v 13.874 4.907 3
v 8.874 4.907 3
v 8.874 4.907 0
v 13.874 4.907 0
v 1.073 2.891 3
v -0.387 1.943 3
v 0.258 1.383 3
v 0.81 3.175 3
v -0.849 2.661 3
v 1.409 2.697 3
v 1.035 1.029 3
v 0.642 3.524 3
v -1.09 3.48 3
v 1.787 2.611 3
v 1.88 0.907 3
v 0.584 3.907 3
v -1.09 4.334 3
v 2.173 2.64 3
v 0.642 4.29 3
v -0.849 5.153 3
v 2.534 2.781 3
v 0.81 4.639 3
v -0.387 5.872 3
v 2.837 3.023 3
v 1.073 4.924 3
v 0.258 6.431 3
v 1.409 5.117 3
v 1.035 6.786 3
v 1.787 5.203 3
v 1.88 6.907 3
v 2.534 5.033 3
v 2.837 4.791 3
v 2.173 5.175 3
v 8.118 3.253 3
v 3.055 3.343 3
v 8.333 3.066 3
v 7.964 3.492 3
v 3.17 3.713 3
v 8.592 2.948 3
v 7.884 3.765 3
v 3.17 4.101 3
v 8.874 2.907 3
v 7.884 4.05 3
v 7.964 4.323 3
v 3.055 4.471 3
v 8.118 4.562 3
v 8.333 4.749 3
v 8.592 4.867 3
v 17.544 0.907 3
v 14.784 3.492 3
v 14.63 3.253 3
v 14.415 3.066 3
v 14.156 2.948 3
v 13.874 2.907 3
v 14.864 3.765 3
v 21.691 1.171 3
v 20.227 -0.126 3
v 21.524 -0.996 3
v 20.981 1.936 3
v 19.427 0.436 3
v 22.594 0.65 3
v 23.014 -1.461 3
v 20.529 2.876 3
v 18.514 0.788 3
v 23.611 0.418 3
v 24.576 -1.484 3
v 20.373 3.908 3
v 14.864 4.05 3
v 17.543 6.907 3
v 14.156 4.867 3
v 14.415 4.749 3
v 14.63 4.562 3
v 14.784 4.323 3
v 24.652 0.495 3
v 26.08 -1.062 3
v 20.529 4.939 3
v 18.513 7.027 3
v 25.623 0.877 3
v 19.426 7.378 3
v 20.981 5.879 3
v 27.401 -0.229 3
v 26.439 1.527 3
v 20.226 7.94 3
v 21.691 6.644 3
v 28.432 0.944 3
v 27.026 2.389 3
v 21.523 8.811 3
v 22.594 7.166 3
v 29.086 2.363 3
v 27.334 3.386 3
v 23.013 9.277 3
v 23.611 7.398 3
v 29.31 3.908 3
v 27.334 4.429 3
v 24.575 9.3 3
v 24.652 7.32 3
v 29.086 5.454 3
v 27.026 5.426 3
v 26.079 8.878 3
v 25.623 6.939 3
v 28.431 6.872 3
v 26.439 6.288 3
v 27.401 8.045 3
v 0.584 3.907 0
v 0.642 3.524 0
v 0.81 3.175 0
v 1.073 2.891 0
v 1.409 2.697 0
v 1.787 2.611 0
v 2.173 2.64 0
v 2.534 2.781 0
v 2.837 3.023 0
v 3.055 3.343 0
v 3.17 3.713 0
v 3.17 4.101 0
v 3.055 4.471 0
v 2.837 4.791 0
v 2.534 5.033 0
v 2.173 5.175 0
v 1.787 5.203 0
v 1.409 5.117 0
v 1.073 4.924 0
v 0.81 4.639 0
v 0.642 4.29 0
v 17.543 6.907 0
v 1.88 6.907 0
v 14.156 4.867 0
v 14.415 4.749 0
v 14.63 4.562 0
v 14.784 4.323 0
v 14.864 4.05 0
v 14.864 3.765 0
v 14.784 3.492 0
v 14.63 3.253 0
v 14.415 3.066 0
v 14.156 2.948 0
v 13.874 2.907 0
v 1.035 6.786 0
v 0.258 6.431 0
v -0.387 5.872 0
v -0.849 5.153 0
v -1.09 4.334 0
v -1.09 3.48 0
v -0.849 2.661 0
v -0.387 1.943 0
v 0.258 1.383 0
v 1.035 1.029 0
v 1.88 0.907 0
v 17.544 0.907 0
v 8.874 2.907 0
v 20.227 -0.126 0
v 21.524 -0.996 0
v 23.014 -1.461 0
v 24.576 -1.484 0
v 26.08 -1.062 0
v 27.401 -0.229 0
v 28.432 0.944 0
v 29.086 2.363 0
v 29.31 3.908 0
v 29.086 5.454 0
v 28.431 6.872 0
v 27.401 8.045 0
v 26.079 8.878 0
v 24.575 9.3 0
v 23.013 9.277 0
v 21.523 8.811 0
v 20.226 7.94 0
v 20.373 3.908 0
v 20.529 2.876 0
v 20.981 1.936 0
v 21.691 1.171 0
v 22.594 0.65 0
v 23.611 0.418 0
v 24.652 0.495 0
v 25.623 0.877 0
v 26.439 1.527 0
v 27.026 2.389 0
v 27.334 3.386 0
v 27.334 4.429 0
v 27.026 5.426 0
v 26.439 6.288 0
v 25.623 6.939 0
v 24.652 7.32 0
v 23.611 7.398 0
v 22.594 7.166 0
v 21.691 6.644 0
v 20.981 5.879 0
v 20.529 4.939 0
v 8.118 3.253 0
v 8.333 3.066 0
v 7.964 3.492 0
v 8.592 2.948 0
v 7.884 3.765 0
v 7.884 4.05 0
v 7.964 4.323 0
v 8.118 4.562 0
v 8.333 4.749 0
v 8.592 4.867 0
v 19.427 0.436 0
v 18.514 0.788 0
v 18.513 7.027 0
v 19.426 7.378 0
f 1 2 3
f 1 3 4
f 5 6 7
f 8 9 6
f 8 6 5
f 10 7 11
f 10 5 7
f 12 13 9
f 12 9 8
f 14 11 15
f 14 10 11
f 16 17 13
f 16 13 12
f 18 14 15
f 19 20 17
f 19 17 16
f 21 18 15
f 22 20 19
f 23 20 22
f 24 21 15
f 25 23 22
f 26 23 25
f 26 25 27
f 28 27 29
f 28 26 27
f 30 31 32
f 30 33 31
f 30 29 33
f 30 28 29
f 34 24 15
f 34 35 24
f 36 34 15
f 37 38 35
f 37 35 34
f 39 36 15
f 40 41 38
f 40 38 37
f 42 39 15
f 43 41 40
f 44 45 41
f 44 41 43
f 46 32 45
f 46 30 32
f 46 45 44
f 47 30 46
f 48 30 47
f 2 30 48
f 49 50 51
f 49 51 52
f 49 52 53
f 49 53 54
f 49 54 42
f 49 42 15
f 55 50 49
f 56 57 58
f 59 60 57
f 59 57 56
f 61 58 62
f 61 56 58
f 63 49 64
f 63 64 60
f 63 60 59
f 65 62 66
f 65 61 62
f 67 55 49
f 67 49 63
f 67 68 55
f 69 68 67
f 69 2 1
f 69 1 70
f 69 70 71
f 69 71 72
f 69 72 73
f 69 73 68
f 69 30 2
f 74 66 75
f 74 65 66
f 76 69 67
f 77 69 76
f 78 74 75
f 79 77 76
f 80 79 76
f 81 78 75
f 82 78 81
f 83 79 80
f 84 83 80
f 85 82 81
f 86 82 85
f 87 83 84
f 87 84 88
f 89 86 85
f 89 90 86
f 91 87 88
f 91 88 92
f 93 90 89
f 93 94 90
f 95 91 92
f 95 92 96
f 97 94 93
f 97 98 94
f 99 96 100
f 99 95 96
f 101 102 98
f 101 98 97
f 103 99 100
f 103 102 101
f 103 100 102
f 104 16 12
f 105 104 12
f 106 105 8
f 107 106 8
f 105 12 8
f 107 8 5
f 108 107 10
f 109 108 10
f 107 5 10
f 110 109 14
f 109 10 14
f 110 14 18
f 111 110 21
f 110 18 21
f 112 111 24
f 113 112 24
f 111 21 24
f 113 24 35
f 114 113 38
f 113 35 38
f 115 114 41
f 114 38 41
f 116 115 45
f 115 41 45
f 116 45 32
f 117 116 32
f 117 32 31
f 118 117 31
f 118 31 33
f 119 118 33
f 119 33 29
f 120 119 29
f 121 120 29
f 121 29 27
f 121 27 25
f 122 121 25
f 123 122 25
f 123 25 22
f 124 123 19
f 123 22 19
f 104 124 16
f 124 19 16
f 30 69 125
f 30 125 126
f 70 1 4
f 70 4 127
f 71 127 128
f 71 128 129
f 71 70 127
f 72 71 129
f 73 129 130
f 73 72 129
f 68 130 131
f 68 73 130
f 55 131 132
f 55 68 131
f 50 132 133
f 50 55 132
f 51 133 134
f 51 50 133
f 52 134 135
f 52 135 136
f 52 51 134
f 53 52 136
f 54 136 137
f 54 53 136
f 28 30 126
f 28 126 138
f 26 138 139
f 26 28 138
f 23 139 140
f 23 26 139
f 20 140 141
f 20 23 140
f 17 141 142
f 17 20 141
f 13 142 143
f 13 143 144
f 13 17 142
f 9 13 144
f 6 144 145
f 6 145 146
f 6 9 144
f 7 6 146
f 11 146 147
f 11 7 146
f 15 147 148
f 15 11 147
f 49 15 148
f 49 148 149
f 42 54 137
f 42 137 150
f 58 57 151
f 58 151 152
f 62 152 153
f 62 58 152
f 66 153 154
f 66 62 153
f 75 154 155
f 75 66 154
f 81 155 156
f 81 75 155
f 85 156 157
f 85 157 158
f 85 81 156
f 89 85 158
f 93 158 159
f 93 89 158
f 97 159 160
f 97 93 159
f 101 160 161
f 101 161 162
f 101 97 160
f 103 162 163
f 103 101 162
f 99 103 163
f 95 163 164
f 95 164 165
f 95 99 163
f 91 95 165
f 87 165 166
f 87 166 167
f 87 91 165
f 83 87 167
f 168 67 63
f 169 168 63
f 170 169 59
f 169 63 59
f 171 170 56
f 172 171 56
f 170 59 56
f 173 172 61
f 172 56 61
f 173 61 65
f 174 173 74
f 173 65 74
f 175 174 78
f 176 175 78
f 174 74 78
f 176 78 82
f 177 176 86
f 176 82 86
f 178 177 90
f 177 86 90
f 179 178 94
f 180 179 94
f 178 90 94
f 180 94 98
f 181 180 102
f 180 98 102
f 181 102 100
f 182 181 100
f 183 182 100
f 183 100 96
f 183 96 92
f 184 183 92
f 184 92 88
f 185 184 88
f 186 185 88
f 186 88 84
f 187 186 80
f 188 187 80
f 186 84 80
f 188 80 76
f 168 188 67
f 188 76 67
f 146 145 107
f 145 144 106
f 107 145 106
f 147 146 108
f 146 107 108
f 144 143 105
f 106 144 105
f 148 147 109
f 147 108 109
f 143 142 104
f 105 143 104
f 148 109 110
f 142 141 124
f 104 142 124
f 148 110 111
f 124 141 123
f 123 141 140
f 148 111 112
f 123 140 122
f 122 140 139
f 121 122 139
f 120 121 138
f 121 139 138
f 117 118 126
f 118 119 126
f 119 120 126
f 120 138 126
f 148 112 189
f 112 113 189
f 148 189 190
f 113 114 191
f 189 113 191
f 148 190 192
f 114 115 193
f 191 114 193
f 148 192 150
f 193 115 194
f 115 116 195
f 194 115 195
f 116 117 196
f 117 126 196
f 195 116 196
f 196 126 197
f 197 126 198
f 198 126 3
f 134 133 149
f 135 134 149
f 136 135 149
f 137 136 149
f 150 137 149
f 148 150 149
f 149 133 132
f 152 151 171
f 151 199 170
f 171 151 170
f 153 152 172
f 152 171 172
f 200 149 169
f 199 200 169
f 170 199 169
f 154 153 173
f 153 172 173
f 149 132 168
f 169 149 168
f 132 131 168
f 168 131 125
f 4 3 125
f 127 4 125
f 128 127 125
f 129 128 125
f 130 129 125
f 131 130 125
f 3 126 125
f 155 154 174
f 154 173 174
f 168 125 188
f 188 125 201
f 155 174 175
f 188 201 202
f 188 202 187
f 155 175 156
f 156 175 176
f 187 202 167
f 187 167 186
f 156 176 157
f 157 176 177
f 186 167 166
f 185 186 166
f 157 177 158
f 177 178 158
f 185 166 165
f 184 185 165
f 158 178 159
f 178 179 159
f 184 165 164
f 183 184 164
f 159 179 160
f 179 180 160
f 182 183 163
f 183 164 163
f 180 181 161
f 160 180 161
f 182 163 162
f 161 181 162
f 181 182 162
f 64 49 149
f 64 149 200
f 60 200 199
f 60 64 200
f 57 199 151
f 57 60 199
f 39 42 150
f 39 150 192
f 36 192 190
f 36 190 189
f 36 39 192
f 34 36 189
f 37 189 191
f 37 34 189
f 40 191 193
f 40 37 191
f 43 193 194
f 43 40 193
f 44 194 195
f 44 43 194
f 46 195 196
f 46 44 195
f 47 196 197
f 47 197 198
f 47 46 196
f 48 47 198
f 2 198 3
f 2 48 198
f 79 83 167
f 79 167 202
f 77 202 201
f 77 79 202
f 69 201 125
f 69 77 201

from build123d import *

# Parameters (mm, degrees)
SKETCH_1_R      = 3.5
SKETCH_1_R_2    = 1.3
EXTRUDE_1_DEPTH = 3


with BuildPart() as part:
    # 草图1 → 凸台-拉伸1 (new body)
    with BuildSketch(Plane.XY.offset(3)):
        with BuildLine():
            Line((17.542771769, 6.907119873), (1.879793686, 6.907119873))
            ThreePointArc((1.879793686, 6.907119873), (-1.120206314, 3.907119873), (1.879793686, 0.907119873))
            Line((1.879793686, 0.907119873), (17.544137719, 0.907119873))
            ThreePointArc((17.544137719, 0.907119873), (18.981359081, 0.640000095), (20.226625317, -0.125682749))
            ThreePointArc((20.226625317, -0.125682749), (29.310375688, 3.908267946), (20.225838323, 7.940446))
            ThreePointArc((20.225838323, 7.940446), (18.980357333, 7.174379894), (17.542771769, 6.907119873))
        make_face()
        with Locations(Location((23.87302906, 3.907737435, 0), (0, 0, 180))):
            Circle(SKETCH_1_R, mode=Mode.SUBTRACT)
        with Locations(Location((1.88402906, 3.907119873, 0), (0, 0, 180))):
            Circle(SKETCH_1_R_2, mode=Mode.SUBTRACT)
        with BuildLine():
            Line((8.87402906, 4.907386497), (13.87402906, 4.907386497))
            ThreePointArc((13.87402906, 4.907386497), (14.87402906, 3.907386497), (13.87402906, 2.907386497))
            Line((13.87402906, 2.907386497), (8.87402906, 2.907386497))
            ThreePointArc((8.87402906, 2.907386497), (7.87402906, 3.907386497), (8.87402906, 4.907386497))
        make_face(mode=Mode.SUBTRACT)
    extrude(amount=-EXTRUDE_1_DEPTH)


solid = part.part
